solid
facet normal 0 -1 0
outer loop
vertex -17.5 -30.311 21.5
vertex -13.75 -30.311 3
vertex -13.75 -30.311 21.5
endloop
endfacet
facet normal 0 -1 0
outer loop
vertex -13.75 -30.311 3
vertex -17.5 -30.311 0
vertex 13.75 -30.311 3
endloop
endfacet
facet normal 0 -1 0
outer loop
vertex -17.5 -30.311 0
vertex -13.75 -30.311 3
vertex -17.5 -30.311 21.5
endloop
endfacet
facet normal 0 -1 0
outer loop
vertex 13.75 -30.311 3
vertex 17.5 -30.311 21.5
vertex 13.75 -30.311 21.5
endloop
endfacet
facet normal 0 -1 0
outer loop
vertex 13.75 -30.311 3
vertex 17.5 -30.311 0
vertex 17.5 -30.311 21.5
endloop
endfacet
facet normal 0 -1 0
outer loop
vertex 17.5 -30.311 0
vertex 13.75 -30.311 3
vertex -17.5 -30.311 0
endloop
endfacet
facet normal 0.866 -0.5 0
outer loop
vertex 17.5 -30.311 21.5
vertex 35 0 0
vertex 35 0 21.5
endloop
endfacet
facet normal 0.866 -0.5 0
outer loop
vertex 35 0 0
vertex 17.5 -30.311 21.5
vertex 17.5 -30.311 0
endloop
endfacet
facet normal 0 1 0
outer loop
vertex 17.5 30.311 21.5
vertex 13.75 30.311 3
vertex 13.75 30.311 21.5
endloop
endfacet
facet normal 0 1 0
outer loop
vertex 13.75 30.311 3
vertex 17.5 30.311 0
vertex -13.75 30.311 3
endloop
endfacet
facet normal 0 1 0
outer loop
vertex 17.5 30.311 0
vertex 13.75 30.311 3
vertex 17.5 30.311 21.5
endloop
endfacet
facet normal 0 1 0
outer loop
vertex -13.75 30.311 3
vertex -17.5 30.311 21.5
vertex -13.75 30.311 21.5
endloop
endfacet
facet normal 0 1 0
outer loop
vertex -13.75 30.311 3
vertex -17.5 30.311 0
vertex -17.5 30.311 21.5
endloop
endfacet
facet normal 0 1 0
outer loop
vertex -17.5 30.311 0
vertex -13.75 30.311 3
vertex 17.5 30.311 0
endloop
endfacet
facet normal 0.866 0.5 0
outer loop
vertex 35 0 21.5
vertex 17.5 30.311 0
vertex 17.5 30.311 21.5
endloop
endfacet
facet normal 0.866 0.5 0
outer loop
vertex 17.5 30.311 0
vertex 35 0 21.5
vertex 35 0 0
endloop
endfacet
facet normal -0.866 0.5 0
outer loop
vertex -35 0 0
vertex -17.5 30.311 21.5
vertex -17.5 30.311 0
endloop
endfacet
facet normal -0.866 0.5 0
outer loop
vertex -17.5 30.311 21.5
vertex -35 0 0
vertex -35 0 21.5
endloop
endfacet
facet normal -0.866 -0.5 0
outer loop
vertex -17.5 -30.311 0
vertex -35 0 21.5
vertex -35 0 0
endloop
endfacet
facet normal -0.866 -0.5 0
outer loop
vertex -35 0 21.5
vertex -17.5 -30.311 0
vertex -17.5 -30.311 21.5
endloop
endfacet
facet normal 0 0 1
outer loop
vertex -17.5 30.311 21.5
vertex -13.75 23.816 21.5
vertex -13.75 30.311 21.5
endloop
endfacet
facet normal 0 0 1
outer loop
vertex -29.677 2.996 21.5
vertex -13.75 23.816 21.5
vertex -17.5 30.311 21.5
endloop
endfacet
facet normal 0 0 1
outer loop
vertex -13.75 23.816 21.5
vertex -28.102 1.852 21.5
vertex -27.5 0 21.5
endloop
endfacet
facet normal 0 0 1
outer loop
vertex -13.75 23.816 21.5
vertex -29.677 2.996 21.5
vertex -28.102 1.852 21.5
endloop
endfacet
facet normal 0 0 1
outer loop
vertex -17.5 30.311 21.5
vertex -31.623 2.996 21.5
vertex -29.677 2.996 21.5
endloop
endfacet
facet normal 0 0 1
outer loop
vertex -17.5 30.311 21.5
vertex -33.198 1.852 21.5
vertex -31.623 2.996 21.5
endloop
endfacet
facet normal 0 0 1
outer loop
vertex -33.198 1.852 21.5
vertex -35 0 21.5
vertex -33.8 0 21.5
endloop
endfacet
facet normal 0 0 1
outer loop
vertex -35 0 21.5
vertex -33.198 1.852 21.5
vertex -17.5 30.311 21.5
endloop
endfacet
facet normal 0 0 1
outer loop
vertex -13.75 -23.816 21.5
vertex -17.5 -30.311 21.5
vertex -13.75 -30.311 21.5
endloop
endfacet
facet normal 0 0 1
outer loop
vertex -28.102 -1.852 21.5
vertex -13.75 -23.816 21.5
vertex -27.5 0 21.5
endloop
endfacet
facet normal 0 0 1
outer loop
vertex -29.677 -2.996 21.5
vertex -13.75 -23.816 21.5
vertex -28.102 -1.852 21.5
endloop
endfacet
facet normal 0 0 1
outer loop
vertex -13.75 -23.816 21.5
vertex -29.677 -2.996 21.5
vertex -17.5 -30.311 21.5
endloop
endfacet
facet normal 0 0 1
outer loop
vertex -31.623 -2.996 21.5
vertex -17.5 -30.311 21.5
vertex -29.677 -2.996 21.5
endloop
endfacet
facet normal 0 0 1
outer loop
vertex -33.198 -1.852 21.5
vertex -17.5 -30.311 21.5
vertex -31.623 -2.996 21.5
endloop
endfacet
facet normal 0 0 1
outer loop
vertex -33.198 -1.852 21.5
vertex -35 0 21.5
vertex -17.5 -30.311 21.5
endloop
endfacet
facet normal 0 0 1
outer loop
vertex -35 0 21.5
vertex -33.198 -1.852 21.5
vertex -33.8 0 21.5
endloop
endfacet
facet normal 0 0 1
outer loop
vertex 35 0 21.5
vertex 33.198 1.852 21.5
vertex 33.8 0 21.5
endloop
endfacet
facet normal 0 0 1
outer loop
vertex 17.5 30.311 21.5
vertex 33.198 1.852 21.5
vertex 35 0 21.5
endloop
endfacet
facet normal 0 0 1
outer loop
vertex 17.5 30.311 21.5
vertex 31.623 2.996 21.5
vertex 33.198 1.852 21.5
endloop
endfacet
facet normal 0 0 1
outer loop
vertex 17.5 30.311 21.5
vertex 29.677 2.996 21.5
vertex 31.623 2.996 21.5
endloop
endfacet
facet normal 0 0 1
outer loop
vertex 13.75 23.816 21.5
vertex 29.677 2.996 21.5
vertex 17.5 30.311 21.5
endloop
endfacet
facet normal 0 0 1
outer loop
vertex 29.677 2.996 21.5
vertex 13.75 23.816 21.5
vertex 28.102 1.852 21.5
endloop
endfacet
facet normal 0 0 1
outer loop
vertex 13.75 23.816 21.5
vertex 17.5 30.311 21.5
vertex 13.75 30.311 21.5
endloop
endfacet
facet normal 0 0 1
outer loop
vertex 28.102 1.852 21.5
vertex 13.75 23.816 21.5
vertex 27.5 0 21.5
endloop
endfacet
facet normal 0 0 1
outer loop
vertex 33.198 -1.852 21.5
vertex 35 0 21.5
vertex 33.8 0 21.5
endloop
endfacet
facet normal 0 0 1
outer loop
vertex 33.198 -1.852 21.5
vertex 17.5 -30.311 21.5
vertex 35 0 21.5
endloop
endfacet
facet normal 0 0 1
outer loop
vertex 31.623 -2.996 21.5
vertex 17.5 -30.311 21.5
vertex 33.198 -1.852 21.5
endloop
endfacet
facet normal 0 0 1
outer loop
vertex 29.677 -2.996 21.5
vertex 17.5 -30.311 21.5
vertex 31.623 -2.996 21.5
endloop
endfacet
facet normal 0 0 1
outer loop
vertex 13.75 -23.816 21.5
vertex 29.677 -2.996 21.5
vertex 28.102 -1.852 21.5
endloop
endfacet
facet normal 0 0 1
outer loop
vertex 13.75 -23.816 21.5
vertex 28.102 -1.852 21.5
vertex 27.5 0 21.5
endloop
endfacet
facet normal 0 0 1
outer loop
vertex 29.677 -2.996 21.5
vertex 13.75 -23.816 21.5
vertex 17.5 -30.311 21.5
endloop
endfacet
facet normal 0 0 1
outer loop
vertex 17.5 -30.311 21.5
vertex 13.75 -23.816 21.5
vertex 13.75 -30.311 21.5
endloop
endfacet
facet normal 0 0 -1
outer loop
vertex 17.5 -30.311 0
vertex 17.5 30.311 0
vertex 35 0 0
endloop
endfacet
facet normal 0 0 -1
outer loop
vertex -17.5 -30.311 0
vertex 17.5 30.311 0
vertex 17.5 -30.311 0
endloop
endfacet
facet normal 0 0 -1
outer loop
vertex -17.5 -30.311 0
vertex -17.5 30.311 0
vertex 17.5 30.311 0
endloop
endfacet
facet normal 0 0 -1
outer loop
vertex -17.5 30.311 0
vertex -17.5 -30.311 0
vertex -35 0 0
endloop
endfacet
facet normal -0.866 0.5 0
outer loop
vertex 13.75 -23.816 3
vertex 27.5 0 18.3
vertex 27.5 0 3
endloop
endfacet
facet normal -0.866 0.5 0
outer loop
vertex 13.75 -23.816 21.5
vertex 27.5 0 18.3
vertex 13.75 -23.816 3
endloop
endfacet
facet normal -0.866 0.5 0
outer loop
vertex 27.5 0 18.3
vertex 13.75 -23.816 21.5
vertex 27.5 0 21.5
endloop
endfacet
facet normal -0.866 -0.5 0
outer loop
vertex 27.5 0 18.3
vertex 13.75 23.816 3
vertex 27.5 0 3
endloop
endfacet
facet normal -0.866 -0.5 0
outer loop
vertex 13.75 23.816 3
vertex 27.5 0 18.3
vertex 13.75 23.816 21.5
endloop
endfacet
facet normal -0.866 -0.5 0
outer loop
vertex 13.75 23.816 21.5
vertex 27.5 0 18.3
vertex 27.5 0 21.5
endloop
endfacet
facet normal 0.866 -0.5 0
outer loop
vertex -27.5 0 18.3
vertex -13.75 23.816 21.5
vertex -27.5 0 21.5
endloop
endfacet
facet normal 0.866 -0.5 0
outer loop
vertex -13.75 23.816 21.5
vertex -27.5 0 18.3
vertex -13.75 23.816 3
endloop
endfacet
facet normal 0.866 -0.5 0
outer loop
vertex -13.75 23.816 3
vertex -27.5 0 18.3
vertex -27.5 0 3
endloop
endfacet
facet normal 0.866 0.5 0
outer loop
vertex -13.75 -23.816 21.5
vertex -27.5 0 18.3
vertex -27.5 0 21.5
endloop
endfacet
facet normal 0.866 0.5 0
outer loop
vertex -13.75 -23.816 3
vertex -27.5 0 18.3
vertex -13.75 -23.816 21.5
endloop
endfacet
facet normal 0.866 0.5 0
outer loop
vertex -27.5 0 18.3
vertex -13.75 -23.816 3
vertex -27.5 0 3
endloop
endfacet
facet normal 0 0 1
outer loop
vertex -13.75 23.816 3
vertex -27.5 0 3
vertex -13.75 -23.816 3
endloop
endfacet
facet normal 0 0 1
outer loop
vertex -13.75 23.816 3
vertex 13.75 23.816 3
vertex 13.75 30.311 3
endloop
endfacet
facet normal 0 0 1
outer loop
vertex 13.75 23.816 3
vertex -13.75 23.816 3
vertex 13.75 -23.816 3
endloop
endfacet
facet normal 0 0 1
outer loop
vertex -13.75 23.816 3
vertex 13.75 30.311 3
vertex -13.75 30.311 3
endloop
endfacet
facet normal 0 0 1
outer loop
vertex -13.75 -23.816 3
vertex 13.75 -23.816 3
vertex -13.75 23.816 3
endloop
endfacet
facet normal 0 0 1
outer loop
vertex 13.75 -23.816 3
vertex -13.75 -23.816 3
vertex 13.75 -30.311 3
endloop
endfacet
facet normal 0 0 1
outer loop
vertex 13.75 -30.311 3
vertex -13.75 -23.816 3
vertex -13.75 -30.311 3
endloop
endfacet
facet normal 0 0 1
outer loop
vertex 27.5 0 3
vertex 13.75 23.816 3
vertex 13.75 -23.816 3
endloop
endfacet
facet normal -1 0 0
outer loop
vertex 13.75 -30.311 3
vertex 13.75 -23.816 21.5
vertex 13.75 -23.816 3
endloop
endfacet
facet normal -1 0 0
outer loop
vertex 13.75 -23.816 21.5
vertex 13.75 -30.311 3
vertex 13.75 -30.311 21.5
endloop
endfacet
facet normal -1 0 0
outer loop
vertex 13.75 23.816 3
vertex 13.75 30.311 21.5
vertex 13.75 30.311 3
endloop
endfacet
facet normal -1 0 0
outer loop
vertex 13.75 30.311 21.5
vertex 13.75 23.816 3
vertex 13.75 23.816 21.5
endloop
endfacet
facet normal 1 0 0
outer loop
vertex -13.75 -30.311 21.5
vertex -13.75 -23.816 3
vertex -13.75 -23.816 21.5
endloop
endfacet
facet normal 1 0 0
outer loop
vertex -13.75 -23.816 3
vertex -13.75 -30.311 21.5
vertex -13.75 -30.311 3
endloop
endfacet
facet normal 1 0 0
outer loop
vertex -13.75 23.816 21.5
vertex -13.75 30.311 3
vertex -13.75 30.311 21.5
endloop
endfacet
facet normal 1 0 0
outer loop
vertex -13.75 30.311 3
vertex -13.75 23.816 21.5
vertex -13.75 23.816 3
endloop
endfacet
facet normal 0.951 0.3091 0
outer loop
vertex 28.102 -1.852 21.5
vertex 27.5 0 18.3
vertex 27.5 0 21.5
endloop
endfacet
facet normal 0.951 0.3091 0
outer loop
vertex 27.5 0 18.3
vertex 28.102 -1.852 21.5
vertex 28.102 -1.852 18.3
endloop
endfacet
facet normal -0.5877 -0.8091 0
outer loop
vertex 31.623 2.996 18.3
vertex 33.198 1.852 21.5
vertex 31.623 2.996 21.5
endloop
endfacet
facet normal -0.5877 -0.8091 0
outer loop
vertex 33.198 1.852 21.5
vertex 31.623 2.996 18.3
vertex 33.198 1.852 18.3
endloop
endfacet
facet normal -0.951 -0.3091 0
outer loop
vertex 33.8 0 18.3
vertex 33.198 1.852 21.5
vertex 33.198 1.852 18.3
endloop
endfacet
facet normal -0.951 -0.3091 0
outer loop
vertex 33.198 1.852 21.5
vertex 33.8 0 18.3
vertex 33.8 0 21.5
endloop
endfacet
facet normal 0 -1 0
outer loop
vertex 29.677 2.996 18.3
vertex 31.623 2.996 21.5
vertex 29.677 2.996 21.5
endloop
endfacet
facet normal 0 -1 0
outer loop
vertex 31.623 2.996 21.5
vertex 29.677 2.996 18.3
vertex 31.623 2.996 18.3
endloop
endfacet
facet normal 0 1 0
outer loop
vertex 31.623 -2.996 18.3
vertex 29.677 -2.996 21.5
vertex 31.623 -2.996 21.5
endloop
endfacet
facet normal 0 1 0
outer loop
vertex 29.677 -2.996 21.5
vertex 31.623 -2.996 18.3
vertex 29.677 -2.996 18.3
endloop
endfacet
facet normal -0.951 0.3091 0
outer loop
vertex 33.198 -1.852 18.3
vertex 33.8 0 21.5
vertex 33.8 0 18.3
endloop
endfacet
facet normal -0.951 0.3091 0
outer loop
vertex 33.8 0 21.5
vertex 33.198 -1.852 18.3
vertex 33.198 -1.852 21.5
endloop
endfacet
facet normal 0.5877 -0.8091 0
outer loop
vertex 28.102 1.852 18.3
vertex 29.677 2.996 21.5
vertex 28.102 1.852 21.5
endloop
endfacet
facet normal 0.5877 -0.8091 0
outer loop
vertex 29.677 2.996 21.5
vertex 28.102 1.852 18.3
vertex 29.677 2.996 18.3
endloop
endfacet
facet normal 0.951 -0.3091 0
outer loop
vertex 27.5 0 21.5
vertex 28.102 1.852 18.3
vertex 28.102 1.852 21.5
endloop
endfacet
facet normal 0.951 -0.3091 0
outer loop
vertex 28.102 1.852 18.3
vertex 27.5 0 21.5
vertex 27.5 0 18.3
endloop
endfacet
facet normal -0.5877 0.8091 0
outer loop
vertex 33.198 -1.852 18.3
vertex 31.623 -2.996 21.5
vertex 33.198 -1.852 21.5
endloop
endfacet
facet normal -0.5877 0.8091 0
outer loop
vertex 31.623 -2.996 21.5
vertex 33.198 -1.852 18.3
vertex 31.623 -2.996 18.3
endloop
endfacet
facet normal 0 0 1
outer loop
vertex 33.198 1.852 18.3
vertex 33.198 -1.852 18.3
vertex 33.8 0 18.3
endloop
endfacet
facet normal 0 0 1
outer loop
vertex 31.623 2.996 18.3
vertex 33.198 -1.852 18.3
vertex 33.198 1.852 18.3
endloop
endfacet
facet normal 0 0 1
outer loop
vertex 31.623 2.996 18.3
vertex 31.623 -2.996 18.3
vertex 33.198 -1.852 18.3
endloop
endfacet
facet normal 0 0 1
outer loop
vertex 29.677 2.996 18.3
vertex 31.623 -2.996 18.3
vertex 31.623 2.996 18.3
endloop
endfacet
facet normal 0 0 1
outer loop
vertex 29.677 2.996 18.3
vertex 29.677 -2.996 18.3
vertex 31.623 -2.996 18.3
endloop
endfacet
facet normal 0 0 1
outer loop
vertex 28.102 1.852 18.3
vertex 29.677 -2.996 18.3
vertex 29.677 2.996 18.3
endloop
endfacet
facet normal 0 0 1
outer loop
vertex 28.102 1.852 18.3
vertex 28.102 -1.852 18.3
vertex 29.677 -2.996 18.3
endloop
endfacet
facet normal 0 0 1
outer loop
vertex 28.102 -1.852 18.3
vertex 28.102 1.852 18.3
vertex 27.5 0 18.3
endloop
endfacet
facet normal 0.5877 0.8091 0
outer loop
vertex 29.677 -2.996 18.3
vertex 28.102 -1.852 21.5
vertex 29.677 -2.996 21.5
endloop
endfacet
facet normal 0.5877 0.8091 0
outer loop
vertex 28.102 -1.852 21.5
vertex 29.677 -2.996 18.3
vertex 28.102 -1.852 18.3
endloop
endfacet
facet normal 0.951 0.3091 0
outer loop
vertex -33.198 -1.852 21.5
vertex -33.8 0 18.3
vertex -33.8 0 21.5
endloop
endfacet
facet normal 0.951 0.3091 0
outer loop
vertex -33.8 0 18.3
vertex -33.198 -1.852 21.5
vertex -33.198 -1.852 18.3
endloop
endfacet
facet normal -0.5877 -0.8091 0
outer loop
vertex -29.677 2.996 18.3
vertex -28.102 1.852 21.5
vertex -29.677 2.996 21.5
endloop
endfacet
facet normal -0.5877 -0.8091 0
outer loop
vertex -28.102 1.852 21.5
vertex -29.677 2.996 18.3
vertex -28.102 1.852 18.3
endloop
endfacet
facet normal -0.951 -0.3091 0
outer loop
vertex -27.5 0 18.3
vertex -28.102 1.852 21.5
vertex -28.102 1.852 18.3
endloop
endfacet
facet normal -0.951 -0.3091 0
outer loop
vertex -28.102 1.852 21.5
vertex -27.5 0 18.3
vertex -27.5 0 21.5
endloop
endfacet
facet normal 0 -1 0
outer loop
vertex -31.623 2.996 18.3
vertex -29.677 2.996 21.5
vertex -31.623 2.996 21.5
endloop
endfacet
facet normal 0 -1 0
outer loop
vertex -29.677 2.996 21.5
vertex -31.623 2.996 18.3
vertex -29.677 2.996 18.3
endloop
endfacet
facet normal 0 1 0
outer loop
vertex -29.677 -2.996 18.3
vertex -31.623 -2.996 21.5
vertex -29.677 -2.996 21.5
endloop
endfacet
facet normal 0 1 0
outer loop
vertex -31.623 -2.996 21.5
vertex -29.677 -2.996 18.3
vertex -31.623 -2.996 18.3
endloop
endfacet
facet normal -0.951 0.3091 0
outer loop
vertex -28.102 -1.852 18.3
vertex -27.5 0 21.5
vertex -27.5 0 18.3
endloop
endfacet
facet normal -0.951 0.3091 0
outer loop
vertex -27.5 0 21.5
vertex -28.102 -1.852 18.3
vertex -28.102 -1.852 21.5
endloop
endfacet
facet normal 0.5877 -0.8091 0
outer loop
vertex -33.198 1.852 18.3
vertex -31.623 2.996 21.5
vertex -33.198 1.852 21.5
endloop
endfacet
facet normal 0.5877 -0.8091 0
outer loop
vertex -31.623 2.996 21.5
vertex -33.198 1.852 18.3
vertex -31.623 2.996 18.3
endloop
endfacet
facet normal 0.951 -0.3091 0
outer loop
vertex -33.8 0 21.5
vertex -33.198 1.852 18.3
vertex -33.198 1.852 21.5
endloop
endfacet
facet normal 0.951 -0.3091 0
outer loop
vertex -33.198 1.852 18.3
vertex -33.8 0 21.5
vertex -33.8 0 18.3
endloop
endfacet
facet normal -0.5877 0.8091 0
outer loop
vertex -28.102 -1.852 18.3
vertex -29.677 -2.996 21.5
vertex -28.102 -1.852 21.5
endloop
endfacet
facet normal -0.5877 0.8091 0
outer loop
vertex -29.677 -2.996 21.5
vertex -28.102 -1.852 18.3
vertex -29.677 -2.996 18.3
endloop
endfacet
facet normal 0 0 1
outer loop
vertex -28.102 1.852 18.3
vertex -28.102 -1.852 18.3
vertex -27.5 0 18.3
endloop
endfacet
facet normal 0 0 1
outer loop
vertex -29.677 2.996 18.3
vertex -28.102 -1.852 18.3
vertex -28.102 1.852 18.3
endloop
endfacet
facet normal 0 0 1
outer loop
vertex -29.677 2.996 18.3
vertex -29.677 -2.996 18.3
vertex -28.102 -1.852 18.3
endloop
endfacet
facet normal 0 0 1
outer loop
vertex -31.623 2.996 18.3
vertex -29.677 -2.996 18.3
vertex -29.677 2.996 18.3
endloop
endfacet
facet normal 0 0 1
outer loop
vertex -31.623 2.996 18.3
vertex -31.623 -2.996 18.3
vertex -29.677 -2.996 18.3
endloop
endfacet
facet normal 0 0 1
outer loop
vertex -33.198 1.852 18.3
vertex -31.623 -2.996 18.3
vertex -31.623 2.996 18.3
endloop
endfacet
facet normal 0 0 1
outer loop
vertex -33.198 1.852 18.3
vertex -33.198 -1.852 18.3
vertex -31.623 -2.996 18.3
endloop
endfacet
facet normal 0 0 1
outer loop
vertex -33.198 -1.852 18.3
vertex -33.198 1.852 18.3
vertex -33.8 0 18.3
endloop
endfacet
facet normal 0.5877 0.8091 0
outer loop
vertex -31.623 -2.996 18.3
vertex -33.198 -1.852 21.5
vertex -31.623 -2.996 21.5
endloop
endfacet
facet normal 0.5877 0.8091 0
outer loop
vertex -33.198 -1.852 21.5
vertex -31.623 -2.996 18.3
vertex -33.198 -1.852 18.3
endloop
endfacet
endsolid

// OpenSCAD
magnetDiameter = 6.3;
magnetHeight = 3.2;
difference()
{
    
    cylinder(h=18.5 + 3, d=55 + 15, $fn=6);
    translate([0, 0, 3])
        cylinder(h=18.5, d=55, $fn=6);
    translate([-55/4, -(55 + 15)/2, 3])
        cube([55/2, 55 + 15, 18.5]);
    translate([(55)/2 + magnetDiameter/2, 0, 18.5 + 3 - magnetHeight])
        cylinder(h=magnetHeight, d=magnetDiameter);
    translate([-(55)/2 -magnetDiameter/2, 0, 18.5 + 3 - magnetHeight])
        cylinder(h=magnetHeight, d=magnetDiameter);
}
